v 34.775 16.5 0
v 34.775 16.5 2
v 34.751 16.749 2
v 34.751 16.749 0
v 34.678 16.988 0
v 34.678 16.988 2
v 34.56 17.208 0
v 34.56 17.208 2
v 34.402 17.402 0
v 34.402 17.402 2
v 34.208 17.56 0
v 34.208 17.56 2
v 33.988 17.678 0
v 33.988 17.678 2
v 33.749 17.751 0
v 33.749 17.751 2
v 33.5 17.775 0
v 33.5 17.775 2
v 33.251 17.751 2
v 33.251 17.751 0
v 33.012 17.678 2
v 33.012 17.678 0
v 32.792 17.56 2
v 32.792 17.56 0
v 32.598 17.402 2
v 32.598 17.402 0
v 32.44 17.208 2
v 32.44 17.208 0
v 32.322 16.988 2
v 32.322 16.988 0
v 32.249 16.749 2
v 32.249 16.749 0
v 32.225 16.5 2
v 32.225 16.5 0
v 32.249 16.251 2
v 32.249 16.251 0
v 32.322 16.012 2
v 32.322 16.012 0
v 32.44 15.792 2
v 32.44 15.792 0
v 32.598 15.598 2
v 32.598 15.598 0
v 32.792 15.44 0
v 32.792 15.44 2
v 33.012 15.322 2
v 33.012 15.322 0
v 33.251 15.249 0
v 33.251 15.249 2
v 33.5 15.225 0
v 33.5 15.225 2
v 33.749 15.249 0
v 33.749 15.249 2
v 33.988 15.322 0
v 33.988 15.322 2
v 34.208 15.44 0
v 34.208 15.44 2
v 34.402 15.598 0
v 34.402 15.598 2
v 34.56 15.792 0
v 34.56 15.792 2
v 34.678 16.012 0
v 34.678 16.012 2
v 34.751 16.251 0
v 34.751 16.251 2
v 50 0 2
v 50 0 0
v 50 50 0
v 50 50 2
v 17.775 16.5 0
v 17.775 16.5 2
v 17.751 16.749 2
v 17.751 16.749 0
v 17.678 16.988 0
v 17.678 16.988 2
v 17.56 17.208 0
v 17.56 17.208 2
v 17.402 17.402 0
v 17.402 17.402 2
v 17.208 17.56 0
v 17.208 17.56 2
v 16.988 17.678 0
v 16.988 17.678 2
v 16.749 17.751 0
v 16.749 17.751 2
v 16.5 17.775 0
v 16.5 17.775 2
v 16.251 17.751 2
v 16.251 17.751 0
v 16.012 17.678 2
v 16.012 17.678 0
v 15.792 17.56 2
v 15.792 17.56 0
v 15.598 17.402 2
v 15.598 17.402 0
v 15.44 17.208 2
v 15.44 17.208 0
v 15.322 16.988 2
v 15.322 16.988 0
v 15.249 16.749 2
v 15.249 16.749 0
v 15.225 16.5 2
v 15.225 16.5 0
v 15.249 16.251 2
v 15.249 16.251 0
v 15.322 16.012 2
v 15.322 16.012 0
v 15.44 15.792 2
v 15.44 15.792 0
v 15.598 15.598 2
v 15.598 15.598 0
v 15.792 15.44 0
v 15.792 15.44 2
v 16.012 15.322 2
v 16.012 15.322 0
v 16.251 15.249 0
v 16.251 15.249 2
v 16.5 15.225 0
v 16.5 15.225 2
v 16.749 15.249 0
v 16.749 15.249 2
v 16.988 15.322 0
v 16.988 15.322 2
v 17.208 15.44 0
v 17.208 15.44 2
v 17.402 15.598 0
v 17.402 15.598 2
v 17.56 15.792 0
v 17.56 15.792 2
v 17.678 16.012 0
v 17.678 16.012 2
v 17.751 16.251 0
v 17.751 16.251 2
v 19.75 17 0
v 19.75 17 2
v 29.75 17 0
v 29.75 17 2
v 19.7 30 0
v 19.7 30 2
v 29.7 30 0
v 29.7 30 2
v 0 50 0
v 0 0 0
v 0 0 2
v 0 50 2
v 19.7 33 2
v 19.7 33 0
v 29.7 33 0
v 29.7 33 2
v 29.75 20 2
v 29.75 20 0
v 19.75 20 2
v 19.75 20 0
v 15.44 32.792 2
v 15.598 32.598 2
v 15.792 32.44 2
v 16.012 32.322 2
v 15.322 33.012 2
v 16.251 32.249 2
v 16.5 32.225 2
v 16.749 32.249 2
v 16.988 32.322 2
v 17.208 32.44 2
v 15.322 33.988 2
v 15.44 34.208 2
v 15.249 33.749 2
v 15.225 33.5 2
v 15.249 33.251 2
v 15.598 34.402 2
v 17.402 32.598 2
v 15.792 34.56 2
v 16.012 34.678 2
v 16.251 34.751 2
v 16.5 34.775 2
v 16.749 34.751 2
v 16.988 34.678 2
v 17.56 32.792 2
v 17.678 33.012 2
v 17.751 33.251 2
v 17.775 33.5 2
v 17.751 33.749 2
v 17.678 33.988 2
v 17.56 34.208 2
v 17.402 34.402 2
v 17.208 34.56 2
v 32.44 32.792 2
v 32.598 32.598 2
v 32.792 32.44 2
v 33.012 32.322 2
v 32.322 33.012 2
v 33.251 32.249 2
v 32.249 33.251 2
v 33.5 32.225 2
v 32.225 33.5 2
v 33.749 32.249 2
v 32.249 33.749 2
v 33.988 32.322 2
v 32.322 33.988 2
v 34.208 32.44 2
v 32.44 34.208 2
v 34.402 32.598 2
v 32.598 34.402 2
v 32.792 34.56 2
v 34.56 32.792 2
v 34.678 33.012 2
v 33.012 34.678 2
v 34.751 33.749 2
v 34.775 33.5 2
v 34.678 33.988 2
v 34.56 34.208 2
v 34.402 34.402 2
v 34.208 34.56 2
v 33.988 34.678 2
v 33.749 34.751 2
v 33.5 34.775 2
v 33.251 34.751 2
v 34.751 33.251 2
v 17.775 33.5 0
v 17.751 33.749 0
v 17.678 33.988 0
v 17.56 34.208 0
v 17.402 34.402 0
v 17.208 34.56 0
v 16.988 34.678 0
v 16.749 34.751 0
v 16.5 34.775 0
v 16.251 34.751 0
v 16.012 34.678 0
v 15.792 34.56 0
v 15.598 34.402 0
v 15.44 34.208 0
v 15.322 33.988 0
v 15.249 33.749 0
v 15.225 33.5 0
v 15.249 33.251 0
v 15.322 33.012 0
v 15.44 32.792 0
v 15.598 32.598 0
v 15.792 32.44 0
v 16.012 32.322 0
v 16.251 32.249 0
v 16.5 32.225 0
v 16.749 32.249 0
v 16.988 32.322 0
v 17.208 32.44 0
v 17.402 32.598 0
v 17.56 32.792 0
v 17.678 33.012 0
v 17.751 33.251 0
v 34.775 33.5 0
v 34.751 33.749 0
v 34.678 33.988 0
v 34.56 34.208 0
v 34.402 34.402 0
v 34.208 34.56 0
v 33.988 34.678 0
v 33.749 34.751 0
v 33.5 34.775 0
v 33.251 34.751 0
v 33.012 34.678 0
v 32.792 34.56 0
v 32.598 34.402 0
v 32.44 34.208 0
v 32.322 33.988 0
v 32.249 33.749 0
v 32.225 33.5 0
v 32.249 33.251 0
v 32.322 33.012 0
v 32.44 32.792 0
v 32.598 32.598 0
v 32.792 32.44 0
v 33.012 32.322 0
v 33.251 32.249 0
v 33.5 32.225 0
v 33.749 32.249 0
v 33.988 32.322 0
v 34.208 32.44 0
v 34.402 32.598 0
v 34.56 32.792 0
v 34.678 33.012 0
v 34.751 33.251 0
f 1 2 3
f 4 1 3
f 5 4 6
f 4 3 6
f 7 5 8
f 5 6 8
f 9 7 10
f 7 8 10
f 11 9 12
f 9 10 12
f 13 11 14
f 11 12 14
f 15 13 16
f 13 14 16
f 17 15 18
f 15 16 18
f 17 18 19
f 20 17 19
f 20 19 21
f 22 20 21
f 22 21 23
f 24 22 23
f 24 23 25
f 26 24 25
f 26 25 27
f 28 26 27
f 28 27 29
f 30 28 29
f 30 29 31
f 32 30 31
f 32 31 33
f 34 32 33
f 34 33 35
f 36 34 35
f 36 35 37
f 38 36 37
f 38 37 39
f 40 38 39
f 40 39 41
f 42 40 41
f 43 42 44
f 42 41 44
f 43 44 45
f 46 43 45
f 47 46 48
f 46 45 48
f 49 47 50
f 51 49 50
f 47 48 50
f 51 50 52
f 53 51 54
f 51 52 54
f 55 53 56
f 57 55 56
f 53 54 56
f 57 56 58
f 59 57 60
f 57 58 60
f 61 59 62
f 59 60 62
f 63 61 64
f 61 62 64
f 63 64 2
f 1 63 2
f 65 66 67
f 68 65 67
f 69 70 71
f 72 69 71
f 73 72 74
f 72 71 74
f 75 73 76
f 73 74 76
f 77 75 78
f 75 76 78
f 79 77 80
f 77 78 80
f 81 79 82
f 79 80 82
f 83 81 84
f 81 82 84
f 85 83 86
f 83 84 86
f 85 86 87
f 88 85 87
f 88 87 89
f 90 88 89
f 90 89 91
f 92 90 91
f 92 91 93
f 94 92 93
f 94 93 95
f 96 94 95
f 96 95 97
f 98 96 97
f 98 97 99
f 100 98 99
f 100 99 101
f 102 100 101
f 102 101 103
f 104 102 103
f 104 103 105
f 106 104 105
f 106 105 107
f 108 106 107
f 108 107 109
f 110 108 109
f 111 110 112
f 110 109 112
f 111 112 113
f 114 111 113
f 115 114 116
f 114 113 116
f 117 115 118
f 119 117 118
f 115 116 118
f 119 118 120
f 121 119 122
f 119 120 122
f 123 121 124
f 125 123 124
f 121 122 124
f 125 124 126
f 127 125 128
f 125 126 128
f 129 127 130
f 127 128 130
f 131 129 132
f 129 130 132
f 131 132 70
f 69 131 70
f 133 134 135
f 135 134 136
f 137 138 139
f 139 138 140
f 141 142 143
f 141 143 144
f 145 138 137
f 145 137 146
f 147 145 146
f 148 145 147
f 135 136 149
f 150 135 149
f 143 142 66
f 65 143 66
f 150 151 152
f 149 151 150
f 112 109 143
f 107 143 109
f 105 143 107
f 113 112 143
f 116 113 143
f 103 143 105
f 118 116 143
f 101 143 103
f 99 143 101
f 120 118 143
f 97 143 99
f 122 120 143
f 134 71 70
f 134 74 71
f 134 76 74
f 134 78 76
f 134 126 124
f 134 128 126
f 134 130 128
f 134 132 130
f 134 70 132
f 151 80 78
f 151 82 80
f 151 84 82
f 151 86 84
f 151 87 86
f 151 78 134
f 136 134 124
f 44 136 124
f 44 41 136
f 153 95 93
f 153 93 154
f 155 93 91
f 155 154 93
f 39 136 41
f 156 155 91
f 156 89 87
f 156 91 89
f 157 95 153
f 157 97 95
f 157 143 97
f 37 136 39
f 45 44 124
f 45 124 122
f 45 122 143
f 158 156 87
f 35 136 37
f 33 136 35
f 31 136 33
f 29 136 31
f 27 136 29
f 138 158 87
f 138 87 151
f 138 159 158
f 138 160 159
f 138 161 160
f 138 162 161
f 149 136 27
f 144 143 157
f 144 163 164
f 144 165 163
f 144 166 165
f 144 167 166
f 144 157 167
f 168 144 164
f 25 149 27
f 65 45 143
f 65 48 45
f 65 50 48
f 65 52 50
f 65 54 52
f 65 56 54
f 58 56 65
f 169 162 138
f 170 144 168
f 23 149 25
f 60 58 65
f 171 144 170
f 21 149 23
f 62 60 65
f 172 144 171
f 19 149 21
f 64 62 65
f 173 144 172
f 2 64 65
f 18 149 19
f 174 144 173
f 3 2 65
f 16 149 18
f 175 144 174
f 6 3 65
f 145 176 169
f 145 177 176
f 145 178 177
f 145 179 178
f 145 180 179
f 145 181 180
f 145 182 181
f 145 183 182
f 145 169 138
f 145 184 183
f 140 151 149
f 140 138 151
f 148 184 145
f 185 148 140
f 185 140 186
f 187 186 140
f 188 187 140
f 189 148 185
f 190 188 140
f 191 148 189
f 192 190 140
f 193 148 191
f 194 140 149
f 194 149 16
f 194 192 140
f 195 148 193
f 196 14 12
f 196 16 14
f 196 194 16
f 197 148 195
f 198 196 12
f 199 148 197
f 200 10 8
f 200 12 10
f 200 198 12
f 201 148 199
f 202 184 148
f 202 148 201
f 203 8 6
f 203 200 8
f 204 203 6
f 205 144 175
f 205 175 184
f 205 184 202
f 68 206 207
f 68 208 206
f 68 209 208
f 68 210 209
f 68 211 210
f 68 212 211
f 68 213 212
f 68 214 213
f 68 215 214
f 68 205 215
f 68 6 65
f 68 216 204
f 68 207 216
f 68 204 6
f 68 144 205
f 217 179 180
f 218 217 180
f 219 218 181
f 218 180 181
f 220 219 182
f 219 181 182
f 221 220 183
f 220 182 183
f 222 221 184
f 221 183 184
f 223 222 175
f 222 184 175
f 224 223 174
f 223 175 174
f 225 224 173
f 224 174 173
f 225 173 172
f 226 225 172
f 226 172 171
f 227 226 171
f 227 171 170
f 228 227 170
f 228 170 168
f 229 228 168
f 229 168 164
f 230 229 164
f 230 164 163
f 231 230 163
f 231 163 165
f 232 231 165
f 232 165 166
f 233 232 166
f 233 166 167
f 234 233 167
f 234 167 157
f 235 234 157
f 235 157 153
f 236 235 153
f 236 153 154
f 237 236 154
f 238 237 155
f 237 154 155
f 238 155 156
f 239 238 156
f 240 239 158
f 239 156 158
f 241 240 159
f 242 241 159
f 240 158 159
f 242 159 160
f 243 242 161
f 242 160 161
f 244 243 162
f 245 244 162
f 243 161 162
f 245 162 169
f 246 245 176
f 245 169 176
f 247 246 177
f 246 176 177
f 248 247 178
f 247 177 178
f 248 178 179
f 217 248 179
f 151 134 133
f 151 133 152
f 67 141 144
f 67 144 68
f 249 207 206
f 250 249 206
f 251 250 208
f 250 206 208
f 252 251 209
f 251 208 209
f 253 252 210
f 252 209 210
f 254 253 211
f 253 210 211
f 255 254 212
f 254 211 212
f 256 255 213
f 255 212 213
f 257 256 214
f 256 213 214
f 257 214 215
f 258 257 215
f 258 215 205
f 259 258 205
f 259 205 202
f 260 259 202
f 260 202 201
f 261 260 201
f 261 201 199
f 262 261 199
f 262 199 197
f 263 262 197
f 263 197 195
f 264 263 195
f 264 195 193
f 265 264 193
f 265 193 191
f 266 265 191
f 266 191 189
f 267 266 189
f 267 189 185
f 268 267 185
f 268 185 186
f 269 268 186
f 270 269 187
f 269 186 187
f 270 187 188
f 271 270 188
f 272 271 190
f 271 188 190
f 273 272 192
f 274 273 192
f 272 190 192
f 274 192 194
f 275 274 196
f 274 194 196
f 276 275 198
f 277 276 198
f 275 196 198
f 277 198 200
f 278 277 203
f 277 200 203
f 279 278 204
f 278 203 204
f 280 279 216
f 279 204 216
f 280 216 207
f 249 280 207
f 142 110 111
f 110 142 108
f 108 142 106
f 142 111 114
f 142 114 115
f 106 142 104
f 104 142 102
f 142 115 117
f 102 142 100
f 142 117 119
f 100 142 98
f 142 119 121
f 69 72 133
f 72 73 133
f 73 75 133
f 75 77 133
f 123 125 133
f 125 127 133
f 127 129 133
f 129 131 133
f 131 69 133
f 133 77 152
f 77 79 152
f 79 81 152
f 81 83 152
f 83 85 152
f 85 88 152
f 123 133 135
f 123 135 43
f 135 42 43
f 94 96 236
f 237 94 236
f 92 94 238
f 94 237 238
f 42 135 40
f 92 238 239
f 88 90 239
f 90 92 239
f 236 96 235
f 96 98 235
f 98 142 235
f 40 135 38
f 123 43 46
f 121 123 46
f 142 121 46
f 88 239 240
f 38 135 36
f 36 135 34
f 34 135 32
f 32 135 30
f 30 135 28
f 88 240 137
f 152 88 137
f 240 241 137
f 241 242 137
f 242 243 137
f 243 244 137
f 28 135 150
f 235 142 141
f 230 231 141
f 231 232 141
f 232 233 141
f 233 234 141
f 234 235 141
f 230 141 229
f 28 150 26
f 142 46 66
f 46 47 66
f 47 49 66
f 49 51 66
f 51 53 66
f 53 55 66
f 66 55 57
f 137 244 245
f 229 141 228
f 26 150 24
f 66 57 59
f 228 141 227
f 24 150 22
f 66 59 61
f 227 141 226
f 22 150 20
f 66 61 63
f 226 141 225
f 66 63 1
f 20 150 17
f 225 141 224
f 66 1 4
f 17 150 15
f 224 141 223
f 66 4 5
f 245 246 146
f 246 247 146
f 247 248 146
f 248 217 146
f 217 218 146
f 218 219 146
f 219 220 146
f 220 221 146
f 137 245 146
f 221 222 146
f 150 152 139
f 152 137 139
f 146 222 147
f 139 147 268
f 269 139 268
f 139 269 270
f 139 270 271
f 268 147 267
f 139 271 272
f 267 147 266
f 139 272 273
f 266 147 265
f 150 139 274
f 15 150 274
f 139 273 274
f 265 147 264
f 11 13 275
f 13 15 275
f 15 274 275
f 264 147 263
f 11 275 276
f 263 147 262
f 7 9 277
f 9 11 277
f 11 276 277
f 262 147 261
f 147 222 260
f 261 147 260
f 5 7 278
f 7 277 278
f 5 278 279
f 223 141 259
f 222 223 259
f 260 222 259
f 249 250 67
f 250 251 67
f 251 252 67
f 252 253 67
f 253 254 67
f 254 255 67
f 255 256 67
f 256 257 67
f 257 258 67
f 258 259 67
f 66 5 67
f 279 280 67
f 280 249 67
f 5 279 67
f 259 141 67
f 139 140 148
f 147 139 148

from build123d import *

# Parameters (mm, degrees)
SKETCH1_W           = 50
SKETCH1_H           = 50
BOSS_EXTRUDE1_DEPTH = 2
CUT_EXTRUDE1_REACH  = 72.739
SKETCH3_R           = 1.275
CUT_EXTRUDE2_REACH  = 72.739
SKETCH4_W           = 10
SKETCH4_H           = 3


with BuildPart() as part:
    # Sketch1 → Boss-Extrude1 (new body)
    with BuildSketch(Plane.XY):
        with Locations((25, 25)):
            Rectangle(SKETCH1_W, SKETCH1_H)
    extrude(amount=BOSS_EXTRUDE1_DEPTH)

    # Sketch3 → Cut-Extrude1 (cut, up to next)
    with BuildSketch(Plane.XY.offset(2), mode=Mode.PRIVATE) as cut_extrude1_sk1:
        with Locations((16.5, 33.5)):
            Circle(SKETCH3_R)
    cut_extrude1_tool1 = extrude(cut_extrude1_sk1.sketch, amount=-CUT_EXTRUDE1_REACH, mode=Mode.PRIVATE) & part.part
    # Sketch3 → Cut-Extrude1 (cut, up to next)
    with BuildSketch(Plane.XY.offset(2), mode=Mode.PRIVATE) as cut_extrude1_sk2:
        with Locations((33.5, 33.5)):
            Circle(SKETCH3_R)
    cut_extrude1_tool2 = extrude(cut_extrude1_sk2.sketch, amount=-CUT_EXTRUDE1_REACH, mode=Mode.PRIVATE) & part.part
    # Sketch3 → Cut-Extrude1 (cut, up to next)
    with BuildSketch(Plane.XY.offset(2), mode=Mode.PRIVATE) as cut_extrude1_sk3:
        with Locations((33.5, 16.5)):
            Circle(SKETCH3_R)
    cut_extrude1_tool3 = extrude(cut_extrude1_sk3.sketch, amount=-CUT_EXTRUDE1_REACH, mode=Mode.PRIVATE) & part.part
    # Sketch3 → Cut-Extrude1 (cut, up to next)
    with BuildSketch(Plane.XY.offset(2), mode=Mode.PRIVATE) as cut_extrude1_sk4:
        with Locations((16.5, 16.5)):
            Circle(SKETCH3_R)
    cut_extrude1_tool4 = extrude(cut_extrude1_sk4.sketch, amount=-CUT_EXTRUDE1_REACH, mode=Mode.PRIVATE) & part.part
    add(cut_extrude1_tool1.solids().sort_by_distance((16.5, 33.5, 2))[0], mode=Mode.SUBTRACT)
    add(cut_extrude1_tool2.solids().sort_by_distance((33.5, 33.5, 2))[0], mode=Mode.SUBTRACT)
    add(cut_extrude1_tool3.solids().sort_by_distance((33.5, 16.5, 2))[0], mode=Mode.SUBTRACT)
    add(cut_extrude1_tool4.solids().sort_by_distance((16.5, 16.5, 2))[0], mode=Mode.SUBTRACT)

    # Sketch4 → Cut-Extrude2 (cut, up to next)
    with BuildSketch(Plane.XY.offset(2), mode=Mode.PRIVATE) as cut_extrude2_sk1:
        with Locations((24.7, 31.5)):
            Rectangle(SKETCH4_W, SKETCH4_H)
    cut_extrude2_tool1 = extrude(cut_extrude2_sk1.sketch, amount=-CUT_EXTRUDE2_REACH, mode=Mode.PRIVATE) & part.part
    # Sketch4 → Cut-Extrude2 (cut, up to next)
    with BuildSketch(Plane.XY.offset(2), mode=Mode.PRIVATE) as cut_extrude2_sk2:
        with Locations((24.75, 18.5)):
            Rectangle(SKETCH4_W, SKETCH4_H)
    cut_extrude2_tool2 = extrude(cut_extrude2_sk2.sketch, amount=-CUT_EXTRUDE2_REACH, mode=Mode.PRIVATE) & part.part
    add(cut_extrude2_tool1.solids().sort_by_distance((24.7, 31.5, 2))[0], mode=Mode.SUBTRACT)
    add(cut_extrude2_tool2.solids().sort_by_distance((24.75, 18.5, 2))[0], mode=Mode.SUBTRACT)


solid = part.part
